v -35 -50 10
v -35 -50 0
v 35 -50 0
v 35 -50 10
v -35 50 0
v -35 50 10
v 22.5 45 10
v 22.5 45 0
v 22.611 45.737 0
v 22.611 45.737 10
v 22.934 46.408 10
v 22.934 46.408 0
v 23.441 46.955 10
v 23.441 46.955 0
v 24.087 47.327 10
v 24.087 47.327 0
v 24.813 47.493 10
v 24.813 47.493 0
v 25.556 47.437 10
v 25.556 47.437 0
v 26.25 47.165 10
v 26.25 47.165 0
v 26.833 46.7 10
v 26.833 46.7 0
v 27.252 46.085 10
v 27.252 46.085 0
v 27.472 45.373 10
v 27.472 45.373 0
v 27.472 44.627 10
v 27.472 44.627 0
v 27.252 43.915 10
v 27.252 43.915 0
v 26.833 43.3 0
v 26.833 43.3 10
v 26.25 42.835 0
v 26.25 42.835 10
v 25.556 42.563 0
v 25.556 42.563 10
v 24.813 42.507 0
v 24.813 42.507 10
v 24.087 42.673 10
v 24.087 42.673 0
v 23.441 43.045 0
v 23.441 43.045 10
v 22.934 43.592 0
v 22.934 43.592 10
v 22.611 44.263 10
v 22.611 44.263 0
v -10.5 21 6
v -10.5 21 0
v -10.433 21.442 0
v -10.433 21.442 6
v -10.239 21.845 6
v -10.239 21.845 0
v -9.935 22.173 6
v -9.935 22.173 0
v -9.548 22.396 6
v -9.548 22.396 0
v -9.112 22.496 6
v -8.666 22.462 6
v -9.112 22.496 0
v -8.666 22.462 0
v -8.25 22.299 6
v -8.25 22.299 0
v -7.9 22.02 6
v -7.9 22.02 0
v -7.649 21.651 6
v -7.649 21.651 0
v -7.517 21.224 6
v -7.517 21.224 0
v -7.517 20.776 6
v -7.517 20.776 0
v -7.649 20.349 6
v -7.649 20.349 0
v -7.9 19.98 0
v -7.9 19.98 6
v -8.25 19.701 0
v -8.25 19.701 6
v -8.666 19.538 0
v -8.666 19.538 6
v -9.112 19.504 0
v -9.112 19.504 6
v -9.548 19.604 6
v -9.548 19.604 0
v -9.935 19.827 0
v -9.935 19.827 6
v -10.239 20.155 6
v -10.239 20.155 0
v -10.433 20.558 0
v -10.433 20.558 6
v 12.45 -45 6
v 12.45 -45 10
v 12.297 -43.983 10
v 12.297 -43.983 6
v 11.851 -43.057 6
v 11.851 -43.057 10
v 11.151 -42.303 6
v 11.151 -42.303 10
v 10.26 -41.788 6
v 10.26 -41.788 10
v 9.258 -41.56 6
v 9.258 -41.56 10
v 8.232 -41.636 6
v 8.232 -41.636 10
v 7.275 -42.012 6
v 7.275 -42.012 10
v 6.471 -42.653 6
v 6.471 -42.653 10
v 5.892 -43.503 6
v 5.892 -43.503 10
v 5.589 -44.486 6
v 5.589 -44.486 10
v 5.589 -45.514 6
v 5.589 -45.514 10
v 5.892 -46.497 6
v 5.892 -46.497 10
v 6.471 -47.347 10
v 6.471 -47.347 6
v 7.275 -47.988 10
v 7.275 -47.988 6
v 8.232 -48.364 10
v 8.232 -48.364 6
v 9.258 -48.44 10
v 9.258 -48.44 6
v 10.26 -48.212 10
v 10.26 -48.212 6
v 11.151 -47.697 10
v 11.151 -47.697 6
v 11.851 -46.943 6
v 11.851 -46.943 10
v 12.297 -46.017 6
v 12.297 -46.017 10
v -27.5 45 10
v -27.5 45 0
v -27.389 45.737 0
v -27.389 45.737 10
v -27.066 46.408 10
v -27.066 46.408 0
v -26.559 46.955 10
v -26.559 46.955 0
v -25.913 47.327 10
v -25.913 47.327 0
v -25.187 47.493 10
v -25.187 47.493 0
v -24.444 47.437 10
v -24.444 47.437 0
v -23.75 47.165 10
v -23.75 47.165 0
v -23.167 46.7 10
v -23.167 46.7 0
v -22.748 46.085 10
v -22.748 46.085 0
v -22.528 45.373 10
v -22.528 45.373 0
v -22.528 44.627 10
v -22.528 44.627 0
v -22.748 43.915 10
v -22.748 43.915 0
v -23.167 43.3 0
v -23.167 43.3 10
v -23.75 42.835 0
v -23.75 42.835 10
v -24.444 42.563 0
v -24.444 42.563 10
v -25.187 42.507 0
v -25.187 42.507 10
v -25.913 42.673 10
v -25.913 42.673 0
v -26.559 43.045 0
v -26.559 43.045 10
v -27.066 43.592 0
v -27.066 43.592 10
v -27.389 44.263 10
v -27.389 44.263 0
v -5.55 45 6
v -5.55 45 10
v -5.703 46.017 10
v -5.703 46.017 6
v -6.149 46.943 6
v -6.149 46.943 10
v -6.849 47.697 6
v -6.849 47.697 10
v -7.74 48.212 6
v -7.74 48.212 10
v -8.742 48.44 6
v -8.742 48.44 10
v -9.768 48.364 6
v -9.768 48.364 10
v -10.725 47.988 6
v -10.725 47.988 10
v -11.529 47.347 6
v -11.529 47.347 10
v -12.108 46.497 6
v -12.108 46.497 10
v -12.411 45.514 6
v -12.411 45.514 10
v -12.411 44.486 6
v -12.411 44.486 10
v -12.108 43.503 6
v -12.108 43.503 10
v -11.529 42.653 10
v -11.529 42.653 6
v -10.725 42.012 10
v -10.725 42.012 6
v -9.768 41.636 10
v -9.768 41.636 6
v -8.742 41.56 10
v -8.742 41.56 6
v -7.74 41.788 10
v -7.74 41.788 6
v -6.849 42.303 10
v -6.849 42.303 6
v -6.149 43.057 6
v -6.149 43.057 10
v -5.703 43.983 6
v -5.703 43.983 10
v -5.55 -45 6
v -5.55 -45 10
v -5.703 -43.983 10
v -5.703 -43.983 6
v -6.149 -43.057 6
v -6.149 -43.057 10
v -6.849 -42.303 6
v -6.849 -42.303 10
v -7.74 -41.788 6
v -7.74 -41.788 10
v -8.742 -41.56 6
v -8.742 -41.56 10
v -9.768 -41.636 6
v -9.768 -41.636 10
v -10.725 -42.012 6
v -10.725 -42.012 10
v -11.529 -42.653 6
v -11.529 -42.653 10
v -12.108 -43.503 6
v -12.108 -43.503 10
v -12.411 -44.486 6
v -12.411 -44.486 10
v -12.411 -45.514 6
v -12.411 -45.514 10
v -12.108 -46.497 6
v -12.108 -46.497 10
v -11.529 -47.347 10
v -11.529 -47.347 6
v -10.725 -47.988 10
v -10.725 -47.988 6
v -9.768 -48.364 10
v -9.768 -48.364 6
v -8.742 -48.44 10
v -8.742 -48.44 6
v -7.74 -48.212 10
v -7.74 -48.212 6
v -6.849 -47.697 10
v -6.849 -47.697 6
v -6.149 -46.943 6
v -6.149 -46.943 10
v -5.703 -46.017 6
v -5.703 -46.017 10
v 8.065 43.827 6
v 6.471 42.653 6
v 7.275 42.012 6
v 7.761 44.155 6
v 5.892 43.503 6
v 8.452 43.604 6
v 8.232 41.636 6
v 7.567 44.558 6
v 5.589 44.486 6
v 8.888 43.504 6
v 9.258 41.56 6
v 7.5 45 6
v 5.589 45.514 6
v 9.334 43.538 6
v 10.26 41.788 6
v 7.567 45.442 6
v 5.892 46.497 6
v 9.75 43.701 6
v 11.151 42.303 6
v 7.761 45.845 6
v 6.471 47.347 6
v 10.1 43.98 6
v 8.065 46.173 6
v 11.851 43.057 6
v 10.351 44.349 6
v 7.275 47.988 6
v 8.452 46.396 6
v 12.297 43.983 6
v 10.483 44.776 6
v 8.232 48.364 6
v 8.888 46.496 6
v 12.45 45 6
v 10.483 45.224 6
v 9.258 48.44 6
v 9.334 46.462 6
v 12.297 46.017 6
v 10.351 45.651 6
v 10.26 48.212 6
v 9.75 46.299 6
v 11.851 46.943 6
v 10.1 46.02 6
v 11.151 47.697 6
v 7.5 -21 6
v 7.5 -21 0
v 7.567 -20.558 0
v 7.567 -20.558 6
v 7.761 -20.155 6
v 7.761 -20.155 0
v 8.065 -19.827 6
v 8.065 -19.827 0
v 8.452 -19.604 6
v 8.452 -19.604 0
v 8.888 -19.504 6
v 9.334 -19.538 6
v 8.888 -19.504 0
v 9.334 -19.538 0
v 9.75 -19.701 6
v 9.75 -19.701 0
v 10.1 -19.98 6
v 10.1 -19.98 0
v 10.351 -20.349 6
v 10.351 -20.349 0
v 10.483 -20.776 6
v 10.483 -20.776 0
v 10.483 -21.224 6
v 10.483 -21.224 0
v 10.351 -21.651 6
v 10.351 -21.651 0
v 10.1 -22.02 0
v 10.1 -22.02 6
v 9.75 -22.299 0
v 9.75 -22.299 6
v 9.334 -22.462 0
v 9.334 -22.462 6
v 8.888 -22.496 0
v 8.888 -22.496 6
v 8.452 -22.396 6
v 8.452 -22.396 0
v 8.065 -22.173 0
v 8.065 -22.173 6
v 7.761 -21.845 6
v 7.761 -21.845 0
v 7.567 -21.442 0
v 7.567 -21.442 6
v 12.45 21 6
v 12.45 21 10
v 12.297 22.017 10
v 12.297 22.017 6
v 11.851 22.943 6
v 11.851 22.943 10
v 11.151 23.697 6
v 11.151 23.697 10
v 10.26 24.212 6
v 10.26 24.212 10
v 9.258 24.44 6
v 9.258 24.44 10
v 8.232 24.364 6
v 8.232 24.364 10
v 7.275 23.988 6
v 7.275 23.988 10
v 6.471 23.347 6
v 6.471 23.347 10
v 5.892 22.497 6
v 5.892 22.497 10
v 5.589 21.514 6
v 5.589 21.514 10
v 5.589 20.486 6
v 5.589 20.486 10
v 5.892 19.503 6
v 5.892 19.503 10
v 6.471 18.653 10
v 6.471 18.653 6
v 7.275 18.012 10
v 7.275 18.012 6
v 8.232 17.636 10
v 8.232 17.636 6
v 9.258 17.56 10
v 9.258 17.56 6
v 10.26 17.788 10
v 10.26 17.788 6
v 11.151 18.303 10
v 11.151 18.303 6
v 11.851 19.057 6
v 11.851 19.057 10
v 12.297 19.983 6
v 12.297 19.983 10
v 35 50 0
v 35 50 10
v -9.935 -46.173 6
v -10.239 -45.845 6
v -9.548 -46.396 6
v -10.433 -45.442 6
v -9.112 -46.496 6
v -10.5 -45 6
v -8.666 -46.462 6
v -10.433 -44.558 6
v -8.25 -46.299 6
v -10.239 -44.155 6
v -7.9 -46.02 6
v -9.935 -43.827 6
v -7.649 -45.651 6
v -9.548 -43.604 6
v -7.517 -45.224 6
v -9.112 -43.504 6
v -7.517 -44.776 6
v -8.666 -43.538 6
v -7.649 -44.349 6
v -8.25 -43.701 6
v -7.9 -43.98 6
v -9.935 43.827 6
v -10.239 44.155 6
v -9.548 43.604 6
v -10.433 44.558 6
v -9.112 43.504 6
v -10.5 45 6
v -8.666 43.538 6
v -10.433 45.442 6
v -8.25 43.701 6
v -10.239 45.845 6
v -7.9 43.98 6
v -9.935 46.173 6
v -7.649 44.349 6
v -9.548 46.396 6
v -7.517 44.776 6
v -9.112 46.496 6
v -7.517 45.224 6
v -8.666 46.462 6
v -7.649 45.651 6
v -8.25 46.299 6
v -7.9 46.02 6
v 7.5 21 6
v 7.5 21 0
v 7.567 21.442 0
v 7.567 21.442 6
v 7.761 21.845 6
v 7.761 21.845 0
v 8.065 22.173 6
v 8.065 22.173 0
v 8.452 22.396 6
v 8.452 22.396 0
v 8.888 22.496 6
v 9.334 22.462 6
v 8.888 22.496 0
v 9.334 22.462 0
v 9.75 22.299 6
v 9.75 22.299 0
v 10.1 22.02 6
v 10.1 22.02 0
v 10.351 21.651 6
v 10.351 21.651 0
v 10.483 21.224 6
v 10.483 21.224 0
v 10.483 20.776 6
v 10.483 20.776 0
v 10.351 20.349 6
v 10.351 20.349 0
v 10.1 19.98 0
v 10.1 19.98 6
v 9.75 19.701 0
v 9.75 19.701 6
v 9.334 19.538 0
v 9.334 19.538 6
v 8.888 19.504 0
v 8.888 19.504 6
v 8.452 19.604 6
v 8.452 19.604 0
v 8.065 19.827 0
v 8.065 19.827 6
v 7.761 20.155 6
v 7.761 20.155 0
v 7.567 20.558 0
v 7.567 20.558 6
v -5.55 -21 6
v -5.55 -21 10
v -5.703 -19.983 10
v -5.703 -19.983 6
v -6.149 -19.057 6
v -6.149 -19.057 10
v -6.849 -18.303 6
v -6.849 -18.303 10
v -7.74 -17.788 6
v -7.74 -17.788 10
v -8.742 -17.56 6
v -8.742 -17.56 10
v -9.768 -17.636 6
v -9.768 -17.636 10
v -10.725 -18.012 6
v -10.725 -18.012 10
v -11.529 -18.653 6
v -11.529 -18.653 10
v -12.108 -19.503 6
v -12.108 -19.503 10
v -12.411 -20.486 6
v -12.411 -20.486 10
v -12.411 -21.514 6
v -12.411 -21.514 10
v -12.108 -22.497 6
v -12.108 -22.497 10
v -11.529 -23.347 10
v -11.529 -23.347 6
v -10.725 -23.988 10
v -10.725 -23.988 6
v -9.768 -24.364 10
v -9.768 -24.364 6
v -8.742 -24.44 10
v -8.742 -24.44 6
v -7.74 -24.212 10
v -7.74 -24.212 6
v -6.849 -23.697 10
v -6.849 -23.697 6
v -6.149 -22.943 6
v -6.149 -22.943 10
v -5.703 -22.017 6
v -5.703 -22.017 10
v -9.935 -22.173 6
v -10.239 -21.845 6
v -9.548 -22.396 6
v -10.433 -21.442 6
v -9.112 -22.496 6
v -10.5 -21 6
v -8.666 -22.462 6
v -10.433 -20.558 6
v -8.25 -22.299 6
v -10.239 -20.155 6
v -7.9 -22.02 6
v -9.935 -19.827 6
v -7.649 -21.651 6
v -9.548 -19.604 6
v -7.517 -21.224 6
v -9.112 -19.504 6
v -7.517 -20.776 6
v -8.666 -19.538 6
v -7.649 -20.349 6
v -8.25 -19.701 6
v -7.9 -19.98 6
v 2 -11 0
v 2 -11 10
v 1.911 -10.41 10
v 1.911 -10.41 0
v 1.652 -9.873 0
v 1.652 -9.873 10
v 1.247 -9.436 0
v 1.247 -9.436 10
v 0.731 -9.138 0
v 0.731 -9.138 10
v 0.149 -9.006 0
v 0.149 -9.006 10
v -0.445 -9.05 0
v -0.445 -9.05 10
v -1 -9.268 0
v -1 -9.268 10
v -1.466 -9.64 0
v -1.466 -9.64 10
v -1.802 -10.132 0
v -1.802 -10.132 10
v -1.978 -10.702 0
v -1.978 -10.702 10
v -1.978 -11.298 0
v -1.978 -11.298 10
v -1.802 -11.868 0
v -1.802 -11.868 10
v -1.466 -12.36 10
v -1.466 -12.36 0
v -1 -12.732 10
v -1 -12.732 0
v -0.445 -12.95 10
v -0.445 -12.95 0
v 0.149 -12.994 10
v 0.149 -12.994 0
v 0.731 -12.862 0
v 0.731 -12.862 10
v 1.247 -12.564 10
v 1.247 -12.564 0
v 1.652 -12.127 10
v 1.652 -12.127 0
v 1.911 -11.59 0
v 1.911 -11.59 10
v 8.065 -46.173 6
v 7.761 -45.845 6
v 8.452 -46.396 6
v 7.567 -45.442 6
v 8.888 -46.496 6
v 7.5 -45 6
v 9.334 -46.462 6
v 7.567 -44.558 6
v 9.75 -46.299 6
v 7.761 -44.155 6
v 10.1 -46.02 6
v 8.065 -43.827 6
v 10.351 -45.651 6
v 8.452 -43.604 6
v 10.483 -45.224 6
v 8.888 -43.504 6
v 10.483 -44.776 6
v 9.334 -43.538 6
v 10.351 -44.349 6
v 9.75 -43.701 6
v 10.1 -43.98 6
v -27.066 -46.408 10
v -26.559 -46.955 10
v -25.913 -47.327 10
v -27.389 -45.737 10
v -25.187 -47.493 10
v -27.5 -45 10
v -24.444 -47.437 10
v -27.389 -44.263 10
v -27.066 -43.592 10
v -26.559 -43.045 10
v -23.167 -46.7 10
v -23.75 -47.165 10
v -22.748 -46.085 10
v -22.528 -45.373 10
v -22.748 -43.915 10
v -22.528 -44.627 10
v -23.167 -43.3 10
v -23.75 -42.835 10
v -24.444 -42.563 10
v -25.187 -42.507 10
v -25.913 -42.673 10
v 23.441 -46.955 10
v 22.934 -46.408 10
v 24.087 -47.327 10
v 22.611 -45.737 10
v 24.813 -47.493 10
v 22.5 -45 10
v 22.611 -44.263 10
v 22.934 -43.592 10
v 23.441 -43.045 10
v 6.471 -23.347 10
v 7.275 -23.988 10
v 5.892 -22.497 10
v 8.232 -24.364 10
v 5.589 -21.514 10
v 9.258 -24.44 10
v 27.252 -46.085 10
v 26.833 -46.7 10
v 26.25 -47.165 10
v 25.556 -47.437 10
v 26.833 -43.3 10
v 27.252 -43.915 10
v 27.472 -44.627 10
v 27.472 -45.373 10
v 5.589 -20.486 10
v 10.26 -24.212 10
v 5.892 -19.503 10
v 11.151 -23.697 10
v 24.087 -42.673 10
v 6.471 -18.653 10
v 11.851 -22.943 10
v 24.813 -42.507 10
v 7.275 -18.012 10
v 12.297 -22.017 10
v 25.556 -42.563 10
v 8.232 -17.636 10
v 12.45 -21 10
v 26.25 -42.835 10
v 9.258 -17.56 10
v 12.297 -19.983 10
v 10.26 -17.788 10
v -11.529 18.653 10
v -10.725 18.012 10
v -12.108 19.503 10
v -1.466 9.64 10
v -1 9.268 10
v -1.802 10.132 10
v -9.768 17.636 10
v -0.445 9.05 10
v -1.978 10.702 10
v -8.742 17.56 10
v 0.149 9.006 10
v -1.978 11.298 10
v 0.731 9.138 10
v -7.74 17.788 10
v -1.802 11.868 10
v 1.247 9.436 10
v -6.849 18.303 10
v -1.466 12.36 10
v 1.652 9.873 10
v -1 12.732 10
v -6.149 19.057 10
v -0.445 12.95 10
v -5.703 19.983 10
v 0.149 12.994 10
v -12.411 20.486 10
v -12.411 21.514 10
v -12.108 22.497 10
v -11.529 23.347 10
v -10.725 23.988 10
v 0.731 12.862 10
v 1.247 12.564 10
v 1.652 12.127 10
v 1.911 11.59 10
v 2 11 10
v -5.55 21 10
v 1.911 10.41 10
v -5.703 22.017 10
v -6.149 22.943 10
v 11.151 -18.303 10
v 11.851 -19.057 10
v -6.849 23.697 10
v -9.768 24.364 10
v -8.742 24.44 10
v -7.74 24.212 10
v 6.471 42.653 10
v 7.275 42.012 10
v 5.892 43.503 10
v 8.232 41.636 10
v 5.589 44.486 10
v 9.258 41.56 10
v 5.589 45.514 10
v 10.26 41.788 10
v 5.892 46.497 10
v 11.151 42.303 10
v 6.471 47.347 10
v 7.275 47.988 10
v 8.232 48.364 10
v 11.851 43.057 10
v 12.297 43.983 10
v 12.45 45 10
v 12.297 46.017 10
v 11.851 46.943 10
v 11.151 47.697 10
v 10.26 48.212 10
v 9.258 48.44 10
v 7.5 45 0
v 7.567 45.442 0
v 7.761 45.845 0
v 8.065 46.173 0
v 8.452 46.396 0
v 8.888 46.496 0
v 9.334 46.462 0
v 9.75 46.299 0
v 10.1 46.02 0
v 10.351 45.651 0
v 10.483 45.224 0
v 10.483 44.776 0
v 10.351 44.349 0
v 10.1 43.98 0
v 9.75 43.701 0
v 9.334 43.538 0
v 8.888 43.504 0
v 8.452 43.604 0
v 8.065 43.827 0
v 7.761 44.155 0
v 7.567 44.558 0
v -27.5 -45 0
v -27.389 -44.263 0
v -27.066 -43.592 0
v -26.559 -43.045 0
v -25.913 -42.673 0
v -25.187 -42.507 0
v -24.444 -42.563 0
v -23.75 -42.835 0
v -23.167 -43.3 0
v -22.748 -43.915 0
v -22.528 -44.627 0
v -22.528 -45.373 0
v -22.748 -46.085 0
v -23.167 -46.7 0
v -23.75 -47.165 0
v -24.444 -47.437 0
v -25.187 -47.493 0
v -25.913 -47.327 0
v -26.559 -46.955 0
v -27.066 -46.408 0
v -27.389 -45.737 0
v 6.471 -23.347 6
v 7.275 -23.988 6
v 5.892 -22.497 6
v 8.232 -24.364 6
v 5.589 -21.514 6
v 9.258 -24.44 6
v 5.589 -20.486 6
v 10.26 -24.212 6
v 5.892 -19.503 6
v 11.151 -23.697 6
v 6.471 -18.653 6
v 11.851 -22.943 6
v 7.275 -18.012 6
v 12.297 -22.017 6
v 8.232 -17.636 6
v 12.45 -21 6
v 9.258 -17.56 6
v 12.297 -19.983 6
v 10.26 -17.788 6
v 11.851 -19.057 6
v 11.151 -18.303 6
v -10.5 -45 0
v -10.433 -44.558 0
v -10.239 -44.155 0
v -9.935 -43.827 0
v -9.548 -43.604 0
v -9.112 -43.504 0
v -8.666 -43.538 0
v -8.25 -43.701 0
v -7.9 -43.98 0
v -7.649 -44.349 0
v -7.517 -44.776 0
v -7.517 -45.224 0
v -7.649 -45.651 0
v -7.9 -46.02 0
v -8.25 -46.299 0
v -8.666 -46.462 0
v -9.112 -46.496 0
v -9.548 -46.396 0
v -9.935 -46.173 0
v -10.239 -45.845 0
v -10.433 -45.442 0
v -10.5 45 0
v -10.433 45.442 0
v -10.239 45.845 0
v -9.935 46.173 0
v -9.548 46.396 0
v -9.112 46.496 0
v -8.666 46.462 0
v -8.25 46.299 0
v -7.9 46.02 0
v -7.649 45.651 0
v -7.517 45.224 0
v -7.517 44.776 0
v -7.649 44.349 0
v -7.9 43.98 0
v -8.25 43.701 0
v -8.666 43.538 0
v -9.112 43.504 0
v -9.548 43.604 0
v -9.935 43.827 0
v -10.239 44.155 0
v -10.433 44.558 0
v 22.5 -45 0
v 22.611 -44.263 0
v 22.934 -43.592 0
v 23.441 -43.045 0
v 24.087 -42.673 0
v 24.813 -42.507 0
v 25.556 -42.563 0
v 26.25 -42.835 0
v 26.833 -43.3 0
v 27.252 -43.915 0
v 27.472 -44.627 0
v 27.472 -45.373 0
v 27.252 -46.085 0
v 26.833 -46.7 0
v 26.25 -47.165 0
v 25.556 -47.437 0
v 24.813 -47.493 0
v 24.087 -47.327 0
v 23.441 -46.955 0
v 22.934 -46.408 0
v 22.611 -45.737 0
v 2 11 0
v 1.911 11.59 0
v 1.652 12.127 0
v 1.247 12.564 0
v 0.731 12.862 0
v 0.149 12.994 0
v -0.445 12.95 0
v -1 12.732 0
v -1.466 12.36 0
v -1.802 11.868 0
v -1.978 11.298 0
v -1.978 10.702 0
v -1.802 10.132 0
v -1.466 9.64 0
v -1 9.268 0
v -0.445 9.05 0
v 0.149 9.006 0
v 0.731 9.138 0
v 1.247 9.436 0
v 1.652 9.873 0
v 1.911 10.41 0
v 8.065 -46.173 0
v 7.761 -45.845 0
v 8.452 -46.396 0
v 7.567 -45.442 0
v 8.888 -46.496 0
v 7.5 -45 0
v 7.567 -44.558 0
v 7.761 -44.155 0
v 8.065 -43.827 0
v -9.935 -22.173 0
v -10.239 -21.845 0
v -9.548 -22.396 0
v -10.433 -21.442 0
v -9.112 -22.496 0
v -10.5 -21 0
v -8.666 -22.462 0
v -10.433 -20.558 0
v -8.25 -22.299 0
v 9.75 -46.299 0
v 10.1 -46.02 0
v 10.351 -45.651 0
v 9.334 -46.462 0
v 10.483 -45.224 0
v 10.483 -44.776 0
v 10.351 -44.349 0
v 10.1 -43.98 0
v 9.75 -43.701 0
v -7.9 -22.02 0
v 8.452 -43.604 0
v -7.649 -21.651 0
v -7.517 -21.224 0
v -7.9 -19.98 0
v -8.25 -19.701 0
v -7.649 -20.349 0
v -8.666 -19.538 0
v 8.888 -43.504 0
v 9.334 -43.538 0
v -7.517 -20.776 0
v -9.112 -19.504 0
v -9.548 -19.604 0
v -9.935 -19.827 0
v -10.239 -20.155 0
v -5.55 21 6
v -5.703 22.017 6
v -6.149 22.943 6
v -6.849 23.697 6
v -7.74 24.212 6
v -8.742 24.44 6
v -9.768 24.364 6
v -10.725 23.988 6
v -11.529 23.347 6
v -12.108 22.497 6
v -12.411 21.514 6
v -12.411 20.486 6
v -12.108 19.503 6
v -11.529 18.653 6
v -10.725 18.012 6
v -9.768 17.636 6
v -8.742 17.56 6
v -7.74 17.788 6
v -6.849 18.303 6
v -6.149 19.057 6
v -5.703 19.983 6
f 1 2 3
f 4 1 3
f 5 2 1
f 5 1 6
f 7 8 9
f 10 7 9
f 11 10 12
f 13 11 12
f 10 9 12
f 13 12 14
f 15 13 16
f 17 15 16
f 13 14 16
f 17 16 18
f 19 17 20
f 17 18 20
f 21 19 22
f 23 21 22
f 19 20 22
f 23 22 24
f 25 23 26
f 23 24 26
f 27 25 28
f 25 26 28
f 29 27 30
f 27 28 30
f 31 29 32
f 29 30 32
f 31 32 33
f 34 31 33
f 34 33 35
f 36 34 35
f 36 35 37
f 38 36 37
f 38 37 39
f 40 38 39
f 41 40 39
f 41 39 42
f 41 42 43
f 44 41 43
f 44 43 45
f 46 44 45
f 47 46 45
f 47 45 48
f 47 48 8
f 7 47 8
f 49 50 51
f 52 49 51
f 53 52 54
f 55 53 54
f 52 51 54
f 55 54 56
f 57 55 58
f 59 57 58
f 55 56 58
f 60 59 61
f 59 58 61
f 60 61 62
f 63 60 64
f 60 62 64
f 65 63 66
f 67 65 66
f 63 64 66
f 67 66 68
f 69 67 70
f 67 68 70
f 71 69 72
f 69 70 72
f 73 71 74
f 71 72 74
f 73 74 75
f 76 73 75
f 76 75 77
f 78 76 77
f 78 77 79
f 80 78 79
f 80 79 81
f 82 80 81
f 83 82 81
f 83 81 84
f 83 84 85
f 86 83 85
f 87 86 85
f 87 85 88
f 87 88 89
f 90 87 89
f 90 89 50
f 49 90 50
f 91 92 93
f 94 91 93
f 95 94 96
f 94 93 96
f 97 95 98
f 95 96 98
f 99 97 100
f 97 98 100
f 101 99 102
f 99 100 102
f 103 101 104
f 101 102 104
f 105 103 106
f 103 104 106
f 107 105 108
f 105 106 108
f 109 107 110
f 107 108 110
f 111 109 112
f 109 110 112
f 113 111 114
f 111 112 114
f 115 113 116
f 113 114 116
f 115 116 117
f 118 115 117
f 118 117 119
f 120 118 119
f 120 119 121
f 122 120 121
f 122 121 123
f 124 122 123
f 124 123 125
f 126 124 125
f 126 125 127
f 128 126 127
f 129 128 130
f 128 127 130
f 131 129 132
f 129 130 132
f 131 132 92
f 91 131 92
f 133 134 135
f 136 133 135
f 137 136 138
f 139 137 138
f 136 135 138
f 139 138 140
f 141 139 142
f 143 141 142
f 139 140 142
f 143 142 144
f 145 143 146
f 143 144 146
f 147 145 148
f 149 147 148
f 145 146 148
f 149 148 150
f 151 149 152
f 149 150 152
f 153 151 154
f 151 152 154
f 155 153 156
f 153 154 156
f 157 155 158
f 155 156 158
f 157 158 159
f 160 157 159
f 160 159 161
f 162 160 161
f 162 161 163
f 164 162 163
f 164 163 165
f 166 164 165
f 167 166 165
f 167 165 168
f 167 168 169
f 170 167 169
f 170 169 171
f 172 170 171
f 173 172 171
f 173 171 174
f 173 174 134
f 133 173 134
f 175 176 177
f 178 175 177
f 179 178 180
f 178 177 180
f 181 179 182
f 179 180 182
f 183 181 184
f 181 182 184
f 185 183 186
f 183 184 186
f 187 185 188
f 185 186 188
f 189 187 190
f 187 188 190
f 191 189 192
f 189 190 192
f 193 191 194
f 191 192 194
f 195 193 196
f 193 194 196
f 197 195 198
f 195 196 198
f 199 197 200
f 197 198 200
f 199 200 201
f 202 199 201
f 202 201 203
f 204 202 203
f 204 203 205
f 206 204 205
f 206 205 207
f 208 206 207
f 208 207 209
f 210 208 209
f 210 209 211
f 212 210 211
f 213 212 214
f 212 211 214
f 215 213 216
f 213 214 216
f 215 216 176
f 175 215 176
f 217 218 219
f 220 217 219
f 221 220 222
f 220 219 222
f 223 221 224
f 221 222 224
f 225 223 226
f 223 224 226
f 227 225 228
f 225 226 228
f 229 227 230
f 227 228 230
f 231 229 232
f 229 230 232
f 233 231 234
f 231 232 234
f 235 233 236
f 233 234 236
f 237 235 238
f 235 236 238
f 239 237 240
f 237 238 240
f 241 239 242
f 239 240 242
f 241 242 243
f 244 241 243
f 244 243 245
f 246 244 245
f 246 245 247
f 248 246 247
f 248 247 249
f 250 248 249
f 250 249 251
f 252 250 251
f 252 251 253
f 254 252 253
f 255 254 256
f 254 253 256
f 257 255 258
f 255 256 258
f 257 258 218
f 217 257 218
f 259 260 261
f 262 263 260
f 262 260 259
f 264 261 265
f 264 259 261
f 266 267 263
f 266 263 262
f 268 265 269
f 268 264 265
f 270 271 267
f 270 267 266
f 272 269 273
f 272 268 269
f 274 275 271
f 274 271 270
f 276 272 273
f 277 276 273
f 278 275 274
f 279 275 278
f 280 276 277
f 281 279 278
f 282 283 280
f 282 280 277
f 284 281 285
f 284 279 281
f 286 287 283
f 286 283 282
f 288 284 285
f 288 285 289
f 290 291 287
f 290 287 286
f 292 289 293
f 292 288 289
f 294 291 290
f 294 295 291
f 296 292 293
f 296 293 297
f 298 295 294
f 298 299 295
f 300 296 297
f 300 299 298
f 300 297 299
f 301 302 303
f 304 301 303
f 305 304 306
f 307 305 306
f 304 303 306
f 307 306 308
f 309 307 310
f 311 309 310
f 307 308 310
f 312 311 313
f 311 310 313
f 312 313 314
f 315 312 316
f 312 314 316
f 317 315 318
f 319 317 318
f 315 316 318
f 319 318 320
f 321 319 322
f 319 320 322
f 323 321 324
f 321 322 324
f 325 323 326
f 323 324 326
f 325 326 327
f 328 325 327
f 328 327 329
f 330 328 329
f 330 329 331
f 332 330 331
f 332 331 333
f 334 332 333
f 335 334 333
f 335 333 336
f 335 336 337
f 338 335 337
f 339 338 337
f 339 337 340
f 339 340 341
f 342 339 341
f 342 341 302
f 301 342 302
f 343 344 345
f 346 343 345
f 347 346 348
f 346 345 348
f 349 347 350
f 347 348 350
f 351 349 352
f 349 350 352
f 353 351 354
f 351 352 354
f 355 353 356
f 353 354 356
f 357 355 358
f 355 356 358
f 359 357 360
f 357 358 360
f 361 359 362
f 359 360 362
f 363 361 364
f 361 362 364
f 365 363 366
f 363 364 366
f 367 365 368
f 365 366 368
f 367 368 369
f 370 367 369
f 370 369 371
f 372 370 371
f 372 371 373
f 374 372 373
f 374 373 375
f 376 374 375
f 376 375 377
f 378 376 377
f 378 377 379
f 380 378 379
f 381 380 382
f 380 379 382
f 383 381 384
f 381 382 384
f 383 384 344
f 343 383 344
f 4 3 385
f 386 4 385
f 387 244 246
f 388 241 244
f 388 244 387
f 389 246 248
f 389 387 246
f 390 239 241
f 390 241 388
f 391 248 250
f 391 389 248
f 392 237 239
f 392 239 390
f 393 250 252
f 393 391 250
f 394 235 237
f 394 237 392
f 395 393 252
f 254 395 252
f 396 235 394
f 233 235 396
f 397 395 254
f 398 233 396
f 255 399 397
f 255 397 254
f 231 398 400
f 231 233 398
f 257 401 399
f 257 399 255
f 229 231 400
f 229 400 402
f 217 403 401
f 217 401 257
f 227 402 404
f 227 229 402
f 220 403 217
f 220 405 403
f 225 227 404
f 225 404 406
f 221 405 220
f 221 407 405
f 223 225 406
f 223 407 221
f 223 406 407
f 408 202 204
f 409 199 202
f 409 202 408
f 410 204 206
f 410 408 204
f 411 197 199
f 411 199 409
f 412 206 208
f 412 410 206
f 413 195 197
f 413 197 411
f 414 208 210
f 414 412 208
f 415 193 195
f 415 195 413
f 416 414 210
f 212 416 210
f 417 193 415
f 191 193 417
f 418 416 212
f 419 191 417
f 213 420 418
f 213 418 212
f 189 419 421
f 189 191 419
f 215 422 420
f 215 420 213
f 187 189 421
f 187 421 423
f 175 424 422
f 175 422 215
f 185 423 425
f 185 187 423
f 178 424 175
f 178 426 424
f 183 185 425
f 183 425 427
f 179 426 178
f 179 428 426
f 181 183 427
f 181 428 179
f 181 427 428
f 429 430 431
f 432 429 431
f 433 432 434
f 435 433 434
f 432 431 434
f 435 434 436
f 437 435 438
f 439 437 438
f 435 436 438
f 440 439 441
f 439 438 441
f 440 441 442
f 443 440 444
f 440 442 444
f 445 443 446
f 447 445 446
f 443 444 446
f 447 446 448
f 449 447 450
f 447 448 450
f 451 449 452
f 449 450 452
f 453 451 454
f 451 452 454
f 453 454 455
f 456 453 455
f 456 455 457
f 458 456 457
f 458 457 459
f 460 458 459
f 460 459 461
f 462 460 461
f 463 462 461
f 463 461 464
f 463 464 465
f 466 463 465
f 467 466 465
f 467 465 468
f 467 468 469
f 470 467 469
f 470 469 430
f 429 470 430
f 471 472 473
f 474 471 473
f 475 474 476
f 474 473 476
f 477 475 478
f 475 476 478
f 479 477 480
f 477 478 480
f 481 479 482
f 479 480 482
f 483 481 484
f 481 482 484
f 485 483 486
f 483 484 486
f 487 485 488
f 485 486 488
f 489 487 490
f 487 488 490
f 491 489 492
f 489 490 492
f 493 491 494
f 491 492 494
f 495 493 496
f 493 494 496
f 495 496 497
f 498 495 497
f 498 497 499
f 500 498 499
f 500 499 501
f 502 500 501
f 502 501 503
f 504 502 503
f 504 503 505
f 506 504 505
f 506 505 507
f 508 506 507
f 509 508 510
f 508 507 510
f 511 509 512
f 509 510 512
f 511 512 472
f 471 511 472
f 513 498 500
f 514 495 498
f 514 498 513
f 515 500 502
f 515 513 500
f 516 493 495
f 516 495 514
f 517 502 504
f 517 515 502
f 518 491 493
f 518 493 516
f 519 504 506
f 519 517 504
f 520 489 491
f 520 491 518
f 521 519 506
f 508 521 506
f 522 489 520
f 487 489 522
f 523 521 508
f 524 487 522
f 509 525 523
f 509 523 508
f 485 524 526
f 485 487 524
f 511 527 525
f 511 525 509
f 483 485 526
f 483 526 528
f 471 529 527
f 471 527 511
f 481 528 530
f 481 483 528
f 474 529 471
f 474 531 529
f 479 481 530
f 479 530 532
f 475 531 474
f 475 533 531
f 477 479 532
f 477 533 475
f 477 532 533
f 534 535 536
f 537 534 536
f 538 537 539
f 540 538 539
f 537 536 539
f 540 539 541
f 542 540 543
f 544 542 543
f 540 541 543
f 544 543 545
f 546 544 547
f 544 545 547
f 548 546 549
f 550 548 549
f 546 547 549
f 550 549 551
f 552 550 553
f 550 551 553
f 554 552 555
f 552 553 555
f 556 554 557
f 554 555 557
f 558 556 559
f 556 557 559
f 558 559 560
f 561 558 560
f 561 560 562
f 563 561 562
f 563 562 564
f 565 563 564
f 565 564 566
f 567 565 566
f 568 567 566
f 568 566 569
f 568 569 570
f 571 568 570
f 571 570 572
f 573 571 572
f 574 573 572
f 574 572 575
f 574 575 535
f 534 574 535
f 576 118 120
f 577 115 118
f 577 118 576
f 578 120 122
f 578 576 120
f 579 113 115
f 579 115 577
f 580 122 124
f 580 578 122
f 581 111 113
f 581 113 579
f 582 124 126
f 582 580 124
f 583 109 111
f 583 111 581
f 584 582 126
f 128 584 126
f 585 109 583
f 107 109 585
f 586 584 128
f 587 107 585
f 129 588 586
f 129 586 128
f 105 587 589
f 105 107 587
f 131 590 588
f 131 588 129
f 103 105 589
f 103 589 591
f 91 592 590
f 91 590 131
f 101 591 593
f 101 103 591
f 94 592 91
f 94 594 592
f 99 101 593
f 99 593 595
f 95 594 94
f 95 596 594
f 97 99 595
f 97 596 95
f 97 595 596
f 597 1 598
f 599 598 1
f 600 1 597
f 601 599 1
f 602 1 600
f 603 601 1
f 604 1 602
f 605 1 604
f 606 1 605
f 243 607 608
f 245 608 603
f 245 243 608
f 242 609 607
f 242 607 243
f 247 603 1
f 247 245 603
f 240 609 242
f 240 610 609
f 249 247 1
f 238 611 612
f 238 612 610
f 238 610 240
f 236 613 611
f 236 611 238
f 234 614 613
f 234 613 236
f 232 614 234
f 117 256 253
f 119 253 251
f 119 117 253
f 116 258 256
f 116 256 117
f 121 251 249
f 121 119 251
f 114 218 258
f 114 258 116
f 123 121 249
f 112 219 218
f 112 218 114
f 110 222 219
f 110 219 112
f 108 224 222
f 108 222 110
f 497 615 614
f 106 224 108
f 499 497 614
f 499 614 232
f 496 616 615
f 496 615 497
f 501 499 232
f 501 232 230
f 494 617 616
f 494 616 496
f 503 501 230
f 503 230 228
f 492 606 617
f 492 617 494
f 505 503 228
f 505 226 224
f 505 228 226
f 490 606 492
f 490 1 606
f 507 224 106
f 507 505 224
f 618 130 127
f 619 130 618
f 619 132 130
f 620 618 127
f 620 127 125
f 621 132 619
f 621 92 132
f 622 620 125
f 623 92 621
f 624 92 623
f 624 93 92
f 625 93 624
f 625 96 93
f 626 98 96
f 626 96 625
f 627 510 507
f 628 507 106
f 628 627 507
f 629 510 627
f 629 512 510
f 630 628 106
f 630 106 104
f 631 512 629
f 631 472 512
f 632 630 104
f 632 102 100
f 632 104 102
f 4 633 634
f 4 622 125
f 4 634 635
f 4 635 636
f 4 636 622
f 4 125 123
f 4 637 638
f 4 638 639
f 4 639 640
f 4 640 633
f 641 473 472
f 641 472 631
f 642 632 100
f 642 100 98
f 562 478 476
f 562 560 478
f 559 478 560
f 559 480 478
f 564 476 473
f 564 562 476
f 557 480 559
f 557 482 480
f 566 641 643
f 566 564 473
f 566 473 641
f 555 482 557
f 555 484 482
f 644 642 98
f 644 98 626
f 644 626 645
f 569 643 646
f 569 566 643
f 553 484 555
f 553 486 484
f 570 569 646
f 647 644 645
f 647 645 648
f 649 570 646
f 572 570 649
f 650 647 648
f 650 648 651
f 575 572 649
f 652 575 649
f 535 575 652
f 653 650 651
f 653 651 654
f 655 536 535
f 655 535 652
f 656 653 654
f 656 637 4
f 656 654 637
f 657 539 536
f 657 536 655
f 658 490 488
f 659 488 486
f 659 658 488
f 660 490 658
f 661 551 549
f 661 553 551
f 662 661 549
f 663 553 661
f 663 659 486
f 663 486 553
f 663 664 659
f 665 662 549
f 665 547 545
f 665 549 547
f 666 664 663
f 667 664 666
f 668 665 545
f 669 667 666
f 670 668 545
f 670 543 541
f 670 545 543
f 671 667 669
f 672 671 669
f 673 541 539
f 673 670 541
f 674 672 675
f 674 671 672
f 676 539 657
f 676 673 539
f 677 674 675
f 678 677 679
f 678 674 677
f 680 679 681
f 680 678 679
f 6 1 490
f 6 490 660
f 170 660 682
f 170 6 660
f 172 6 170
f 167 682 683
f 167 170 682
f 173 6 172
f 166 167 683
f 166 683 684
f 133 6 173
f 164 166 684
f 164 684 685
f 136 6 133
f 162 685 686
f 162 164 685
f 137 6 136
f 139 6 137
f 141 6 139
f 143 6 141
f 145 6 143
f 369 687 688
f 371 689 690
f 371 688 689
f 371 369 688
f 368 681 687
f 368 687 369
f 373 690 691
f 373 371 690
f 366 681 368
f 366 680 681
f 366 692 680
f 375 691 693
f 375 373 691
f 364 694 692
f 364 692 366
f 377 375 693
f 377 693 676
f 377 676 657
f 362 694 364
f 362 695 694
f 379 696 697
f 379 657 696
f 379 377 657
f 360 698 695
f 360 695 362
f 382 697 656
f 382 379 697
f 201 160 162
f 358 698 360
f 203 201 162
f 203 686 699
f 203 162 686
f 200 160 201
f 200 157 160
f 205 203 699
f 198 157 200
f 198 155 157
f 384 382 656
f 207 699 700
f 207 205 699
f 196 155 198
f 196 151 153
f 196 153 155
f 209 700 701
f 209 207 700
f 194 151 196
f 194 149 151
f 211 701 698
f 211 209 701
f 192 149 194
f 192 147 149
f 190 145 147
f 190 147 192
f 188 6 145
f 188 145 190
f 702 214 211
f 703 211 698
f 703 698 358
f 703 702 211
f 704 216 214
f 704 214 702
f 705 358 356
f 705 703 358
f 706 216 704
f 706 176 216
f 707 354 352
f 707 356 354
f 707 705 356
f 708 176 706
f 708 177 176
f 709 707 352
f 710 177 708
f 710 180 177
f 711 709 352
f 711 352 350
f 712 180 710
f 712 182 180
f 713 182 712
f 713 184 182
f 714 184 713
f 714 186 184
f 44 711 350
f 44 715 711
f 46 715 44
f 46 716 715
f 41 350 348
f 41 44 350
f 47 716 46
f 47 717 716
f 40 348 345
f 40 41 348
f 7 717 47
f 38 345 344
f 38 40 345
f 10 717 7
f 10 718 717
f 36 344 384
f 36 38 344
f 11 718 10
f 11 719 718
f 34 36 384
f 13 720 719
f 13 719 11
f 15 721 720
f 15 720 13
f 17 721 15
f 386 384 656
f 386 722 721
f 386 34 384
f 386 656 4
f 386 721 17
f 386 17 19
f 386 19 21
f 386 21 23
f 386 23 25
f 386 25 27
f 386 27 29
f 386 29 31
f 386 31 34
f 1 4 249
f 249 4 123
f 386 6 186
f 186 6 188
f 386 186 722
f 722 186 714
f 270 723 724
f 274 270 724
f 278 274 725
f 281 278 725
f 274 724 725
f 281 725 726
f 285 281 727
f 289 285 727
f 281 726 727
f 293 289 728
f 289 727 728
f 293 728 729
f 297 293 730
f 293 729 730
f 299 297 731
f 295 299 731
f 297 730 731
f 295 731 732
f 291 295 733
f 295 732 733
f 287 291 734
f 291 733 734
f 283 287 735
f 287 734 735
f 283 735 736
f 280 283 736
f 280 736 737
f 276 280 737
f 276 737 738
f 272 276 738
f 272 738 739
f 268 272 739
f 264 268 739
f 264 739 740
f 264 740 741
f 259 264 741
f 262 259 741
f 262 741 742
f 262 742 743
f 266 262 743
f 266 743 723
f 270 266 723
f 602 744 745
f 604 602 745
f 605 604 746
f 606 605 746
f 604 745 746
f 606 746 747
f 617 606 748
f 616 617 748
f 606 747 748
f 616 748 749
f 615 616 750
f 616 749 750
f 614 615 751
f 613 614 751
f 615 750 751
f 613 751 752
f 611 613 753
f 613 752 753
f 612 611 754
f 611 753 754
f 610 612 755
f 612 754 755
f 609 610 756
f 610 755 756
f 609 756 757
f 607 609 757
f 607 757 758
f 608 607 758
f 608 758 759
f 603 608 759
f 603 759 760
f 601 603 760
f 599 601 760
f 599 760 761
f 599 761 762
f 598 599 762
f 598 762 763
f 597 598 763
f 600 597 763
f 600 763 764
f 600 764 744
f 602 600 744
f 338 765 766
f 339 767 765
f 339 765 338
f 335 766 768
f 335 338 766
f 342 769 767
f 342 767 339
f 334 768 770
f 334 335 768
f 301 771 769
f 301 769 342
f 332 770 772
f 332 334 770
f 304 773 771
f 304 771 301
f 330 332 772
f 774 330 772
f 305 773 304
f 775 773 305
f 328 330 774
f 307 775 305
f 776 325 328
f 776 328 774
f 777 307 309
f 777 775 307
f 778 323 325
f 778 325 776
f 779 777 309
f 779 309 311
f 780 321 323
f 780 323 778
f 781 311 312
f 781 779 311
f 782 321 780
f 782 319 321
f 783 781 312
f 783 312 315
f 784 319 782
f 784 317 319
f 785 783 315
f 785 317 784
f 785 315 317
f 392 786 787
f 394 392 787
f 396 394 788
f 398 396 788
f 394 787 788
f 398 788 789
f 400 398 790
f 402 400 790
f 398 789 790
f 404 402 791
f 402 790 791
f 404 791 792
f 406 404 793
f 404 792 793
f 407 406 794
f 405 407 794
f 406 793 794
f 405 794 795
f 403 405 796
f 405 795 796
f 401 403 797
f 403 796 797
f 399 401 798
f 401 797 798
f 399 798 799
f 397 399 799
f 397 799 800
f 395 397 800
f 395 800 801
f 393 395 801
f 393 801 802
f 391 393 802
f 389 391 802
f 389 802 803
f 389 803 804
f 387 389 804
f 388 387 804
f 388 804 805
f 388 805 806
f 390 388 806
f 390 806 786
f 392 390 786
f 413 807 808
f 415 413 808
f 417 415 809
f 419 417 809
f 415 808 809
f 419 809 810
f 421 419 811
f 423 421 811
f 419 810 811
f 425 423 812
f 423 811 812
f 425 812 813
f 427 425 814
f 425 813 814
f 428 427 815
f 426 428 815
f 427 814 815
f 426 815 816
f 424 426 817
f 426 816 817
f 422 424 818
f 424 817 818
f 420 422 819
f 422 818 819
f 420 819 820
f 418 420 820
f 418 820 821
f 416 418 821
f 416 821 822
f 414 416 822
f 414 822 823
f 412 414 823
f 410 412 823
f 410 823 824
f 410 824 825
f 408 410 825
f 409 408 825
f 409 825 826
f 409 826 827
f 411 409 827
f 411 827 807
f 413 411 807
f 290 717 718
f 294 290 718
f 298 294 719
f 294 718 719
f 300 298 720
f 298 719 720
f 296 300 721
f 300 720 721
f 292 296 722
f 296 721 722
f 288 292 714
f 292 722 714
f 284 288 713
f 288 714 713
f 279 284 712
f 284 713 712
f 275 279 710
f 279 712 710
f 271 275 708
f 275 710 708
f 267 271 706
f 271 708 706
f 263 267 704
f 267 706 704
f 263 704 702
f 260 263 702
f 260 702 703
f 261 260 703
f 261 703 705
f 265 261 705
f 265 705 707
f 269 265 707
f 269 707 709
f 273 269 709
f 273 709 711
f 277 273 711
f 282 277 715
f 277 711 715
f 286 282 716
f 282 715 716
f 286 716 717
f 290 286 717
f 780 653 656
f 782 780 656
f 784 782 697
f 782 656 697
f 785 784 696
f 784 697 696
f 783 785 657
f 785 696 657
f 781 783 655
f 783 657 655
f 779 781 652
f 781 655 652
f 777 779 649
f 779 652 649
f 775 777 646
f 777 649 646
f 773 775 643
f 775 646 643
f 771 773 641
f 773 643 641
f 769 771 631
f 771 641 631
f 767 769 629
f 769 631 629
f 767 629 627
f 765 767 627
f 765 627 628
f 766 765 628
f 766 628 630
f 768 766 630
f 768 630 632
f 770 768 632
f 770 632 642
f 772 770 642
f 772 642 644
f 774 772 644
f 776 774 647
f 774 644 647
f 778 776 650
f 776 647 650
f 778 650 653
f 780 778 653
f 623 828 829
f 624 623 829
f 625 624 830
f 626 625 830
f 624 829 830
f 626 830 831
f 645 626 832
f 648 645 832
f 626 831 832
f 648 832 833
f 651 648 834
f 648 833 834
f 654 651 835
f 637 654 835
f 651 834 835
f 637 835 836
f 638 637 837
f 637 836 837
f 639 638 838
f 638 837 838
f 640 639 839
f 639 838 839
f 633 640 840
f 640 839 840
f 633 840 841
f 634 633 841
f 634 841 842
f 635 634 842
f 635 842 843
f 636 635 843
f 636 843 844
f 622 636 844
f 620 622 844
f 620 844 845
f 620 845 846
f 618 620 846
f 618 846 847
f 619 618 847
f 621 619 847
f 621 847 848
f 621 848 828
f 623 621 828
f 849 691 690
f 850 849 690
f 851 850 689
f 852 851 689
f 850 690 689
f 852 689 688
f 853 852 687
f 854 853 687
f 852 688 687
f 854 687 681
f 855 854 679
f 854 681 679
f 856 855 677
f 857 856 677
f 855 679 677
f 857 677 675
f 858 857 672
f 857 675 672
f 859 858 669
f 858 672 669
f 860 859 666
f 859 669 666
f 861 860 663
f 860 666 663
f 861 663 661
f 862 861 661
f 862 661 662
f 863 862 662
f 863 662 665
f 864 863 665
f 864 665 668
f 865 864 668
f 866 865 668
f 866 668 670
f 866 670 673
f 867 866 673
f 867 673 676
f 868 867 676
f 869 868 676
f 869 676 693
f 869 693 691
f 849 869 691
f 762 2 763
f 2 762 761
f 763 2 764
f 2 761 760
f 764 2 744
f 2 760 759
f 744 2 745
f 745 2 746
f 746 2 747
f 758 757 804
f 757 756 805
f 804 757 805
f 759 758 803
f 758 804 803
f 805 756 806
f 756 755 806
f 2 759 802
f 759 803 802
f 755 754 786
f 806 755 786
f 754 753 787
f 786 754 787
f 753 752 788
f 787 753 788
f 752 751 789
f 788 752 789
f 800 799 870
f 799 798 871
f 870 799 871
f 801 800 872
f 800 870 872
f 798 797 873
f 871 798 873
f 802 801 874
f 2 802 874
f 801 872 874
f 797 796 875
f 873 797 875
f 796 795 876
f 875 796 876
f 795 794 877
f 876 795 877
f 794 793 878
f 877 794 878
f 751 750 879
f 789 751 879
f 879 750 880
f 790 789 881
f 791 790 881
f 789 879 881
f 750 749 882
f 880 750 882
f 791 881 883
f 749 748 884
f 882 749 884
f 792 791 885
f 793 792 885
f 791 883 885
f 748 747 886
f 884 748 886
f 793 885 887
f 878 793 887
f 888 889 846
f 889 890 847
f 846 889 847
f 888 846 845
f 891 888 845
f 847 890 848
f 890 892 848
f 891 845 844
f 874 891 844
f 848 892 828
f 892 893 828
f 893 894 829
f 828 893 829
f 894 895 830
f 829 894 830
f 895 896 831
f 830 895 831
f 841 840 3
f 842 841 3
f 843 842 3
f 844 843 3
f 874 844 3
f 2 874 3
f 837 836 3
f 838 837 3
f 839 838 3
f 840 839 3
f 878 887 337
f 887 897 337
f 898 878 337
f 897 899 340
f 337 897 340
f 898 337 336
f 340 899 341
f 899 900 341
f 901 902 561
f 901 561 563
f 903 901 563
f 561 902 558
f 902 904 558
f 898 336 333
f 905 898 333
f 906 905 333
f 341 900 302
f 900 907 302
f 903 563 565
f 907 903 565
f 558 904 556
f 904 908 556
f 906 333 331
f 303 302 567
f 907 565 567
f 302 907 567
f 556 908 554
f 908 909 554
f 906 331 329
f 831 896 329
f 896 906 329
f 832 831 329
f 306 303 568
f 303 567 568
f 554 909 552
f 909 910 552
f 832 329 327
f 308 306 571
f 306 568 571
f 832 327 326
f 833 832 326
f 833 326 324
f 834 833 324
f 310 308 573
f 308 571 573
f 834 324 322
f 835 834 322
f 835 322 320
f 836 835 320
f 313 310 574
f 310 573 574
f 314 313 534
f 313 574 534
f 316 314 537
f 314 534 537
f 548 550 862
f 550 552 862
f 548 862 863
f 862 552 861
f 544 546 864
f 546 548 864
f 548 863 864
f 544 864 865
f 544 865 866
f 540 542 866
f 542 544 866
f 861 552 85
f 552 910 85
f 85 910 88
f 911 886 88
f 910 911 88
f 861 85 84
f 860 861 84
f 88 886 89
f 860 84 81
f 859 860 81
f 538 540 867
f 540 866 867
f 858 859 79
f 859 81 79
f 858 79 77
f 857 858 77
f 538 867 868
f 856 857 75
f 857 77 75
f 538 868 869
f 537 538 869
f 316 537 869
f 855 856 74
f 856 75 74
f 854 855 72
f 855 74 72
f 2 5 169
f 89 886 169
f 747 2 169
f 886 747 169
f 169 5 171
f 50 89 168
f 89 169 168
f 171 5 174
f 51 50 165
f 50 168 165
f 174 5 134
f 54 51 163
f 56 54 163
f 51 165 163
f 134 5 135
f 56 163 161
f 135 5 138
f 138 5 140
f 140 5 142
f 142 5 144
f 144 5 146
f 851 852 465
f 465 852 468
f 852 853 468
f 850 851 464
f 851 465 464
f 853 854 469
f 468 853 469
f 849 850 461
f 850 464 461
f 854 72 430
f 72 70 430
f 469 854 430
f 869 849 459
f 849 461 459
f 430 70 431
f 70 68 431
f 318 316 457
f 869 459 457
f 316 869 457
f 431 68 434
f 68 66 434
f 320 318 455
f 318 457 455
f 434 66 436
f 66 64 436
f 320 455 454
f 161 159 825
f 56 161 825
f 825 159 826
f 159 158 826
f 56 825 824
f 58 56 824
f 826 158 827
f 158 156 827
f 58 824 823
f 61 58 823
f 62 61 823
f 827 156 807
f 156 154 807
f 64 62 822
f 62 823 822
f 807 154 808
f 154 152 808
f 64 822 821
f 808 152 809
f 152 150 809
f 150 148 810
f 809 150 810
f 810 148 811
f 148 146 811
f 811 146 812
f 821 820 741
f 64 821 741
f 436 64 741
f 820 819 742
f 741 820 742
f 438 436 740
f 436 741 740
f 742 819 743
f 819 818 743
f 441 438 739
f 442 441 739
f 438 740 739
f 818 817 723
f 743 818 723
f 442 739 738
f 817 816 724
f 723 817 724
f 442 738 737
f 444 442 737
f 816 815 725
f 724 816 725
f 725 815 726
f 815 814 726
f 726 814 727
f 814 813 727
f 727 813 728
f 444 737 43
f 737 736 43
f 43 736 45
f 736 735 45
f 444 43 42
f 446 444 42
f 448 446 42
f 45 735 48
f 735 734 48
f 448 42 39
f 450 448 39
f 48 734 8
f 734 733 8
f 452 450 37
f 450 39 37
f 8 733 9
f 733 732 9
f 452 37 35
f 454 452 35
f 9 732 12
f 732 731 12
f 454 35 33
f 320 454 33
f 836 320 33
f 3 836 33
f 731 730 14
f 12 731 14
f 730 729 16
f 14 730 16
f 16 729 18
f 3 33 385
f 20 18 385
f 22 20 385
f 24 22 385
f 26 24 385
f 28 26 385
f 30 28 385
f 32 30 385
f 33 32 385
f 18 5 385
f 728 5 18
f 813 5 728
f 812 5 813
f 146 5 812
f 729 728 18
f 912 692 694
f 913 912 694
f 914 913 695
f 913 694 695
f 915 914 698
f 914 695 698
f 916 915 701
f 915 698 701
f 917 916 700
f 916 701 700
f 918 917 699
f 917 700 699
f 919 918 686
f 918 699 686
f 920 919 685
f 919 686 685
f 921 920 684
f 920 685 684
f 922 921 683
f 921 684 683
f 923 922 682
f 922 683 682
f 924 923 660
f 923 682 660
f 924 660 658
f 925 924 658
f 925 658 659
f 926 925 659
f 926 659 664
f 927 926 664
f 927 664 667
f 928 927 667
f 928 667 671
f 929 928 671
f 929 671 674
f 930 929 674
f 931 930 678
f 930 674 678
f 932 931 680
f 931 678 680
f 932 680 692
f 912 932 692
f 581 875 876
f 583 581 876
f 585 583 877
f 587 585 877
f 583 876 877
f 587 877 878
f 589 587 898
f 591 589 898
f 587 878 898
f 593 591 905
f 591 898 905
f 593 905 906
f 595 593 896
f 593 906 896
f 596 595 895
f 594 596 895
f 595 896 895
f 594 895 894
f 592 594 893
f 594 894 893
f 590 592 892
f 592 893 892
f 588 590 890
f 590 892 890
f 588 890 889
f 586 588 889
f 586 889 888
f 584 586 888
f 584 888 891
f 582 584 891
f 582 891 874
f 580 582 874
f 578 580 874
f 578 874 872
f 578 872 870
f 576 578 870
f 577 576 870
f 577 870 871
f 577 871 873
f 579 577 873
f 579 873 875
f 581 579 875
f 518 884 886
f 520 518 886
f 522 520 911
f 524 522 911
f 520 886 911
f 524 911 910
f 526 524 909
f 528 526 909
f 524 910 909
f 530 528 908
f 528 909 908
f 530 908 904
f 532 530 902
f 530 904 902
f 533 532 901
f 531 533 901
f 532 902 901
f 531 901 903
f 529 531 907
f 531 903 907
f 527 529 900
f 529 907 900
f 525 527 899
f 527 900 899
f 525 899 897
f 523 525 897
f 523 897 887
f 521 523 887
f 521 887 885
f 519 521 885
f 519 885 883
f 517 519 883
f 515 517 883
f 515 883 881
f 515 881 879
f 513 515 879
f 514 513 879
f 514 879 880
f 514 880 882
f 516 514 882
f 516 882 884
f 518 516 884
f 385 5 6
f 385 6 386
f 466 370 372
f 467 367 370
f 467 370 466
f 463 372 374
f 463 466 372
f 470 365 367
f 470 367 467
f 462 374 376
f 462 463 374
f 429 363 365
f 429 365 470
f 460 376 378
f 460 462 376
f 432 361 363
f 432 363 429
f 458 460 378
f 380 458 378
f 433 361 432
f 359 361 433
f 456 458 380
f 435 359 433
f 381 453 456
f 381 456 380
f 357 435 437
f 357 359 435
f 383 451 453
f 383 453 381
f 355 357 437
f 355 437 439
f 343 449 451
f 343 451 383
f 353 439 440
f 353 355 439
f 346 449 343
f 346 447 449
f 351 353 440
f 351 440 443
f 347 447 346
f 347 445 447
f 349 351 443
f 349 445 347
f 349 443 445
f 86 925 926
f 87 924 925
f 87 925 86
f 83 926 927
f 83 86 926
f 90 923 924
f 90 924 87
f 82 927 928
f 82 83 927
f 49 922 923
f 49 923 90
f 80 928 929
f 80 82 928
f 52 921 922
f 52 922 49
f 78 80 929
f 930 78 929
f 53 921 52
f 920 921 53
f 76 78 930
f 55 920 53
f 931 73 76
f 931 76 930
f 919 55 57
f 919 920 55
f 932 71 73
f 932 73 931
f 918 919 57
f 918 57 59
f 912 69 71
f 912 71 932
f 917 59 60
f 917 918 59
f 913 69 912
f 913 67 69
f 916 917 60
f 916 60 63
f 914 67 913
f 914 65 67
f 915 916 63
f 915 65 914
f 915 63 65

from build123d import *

# Parameters (mm, degrees)
SKETCH1_W           = 70
SKETCH1_H           = 100
BOSS_EXTRUDE1_DEPTH = 10
SKETCH2_R           = 2.5
CUT_EXTRUDE1_DEPTH  = 11
SKETCH3_R           = 1.5
CUT_EXTRUDE2_DEPTH  = 11
SKETCH4_R           = 3.45
CUT_EXTRUDE3_DEPTH  = 4
SKETCH5_R           = 2
CUT_EXTRUDE4_DEPTH  = 11


with BuildPart() as part:
    # Sketch1 → Boss-Extrude1 (new body)
    with BuildSketch(Plane.XY):
        Rectangle(SKETCH1_W, SKETCH1_H)
    extrude(amount=BOSS_EXTRUDE1_DEPTH)

    # Sketch2 → Cut-Extrude1 (cut, through all)
    with BuildSketch(Plane(origin=(0, 0, 0), x_dir=(-1, 0, 0), z_dir=(0, 0, -1))):
        with Locations((-25, 45)):
            Circle(SKETCH2_R)
        with Locations((25, 45)):
            Circle(SKETCH2_R)
        with Locations((-25, -45)):
            Circle(SKETCH2_R)
        with Locations((25, -45)):
            Circle(SKETCH2_R)
    extrude(amount=-CUT_EXTRUDE1_DEPTH, mode=Mode.SUBTRACT)

    # Sketch3 → Cut-Extrude2 (cut, through all)
    with BuildSketch(Plane(origin=(0, 0, 0), x_dir=(-1, 0, 0), z_dir=(0, 0, -1))):
        with Locations((9, 21)):
            Circle(SKETCH3_R)
        with Locations((9, 45)):
            Circle(SKETCH3_R)
        with Locations((-9, 21)):
            Circle(SKETCH3_R)
        with Locations((-9, 45)):
            Circle(SKETCH3_R)
        with Locations((9, -45)):
            Circle(SKETCH3_R)
        with Locations((9, -21)):
            Circle(SKETCH3_R)
        with Locations((-9, -45)):
            Circle(SKETCH3_R)
        with Locations((-9, -21)):
            Circle(SKETCH3_R)
    extrude(amount=-CUT_EXTRUDE2_DEPTH, mode=Mode.SUBTRACT)

    # Sketch4 → Cut-Extrude3 (cut)
    with BuildSketch(Plane.XY.offset(10)):
        with Locations((-9, 45)):
            Circle(SKETCH4_R)
        with Locations((-9, 21)):
            Circle(SKETCH4_R)
        with Locations((9, 21)):
            Circle(SKETCH4_R)
        with Locations((9, 45)):
            Circle(SKETCH4_R)
        with Locations((9, -21)):
            Circle(SKETCH4_R)
        with Locations((-9, -21)):
            Circle(SKETCH4_R)
        with Locations((-9, -45)):
            Circle(SKETCH4_R)
        with Locations((9, -45)):
            Circle(SKETCH4_R)
    extrude(amount=-CUT_EXTRUDE3_DEPTH, mode=Mode.SUBTRACT)

    # Sketch5 → Cut-Extrude4 (cut, through all)
    with BuildSketch(Plane.XY.offset(10)):
        with Locations((0, -11)):
            Circle(SKETCH5_R)
        with Locations((0, 11)):
            Circle(SKETCH5_R)
    extrude(amount=-CUT_EXTRUDE4_DEPTH, mode=Mode.SUBTRACT)


solid = part.part
